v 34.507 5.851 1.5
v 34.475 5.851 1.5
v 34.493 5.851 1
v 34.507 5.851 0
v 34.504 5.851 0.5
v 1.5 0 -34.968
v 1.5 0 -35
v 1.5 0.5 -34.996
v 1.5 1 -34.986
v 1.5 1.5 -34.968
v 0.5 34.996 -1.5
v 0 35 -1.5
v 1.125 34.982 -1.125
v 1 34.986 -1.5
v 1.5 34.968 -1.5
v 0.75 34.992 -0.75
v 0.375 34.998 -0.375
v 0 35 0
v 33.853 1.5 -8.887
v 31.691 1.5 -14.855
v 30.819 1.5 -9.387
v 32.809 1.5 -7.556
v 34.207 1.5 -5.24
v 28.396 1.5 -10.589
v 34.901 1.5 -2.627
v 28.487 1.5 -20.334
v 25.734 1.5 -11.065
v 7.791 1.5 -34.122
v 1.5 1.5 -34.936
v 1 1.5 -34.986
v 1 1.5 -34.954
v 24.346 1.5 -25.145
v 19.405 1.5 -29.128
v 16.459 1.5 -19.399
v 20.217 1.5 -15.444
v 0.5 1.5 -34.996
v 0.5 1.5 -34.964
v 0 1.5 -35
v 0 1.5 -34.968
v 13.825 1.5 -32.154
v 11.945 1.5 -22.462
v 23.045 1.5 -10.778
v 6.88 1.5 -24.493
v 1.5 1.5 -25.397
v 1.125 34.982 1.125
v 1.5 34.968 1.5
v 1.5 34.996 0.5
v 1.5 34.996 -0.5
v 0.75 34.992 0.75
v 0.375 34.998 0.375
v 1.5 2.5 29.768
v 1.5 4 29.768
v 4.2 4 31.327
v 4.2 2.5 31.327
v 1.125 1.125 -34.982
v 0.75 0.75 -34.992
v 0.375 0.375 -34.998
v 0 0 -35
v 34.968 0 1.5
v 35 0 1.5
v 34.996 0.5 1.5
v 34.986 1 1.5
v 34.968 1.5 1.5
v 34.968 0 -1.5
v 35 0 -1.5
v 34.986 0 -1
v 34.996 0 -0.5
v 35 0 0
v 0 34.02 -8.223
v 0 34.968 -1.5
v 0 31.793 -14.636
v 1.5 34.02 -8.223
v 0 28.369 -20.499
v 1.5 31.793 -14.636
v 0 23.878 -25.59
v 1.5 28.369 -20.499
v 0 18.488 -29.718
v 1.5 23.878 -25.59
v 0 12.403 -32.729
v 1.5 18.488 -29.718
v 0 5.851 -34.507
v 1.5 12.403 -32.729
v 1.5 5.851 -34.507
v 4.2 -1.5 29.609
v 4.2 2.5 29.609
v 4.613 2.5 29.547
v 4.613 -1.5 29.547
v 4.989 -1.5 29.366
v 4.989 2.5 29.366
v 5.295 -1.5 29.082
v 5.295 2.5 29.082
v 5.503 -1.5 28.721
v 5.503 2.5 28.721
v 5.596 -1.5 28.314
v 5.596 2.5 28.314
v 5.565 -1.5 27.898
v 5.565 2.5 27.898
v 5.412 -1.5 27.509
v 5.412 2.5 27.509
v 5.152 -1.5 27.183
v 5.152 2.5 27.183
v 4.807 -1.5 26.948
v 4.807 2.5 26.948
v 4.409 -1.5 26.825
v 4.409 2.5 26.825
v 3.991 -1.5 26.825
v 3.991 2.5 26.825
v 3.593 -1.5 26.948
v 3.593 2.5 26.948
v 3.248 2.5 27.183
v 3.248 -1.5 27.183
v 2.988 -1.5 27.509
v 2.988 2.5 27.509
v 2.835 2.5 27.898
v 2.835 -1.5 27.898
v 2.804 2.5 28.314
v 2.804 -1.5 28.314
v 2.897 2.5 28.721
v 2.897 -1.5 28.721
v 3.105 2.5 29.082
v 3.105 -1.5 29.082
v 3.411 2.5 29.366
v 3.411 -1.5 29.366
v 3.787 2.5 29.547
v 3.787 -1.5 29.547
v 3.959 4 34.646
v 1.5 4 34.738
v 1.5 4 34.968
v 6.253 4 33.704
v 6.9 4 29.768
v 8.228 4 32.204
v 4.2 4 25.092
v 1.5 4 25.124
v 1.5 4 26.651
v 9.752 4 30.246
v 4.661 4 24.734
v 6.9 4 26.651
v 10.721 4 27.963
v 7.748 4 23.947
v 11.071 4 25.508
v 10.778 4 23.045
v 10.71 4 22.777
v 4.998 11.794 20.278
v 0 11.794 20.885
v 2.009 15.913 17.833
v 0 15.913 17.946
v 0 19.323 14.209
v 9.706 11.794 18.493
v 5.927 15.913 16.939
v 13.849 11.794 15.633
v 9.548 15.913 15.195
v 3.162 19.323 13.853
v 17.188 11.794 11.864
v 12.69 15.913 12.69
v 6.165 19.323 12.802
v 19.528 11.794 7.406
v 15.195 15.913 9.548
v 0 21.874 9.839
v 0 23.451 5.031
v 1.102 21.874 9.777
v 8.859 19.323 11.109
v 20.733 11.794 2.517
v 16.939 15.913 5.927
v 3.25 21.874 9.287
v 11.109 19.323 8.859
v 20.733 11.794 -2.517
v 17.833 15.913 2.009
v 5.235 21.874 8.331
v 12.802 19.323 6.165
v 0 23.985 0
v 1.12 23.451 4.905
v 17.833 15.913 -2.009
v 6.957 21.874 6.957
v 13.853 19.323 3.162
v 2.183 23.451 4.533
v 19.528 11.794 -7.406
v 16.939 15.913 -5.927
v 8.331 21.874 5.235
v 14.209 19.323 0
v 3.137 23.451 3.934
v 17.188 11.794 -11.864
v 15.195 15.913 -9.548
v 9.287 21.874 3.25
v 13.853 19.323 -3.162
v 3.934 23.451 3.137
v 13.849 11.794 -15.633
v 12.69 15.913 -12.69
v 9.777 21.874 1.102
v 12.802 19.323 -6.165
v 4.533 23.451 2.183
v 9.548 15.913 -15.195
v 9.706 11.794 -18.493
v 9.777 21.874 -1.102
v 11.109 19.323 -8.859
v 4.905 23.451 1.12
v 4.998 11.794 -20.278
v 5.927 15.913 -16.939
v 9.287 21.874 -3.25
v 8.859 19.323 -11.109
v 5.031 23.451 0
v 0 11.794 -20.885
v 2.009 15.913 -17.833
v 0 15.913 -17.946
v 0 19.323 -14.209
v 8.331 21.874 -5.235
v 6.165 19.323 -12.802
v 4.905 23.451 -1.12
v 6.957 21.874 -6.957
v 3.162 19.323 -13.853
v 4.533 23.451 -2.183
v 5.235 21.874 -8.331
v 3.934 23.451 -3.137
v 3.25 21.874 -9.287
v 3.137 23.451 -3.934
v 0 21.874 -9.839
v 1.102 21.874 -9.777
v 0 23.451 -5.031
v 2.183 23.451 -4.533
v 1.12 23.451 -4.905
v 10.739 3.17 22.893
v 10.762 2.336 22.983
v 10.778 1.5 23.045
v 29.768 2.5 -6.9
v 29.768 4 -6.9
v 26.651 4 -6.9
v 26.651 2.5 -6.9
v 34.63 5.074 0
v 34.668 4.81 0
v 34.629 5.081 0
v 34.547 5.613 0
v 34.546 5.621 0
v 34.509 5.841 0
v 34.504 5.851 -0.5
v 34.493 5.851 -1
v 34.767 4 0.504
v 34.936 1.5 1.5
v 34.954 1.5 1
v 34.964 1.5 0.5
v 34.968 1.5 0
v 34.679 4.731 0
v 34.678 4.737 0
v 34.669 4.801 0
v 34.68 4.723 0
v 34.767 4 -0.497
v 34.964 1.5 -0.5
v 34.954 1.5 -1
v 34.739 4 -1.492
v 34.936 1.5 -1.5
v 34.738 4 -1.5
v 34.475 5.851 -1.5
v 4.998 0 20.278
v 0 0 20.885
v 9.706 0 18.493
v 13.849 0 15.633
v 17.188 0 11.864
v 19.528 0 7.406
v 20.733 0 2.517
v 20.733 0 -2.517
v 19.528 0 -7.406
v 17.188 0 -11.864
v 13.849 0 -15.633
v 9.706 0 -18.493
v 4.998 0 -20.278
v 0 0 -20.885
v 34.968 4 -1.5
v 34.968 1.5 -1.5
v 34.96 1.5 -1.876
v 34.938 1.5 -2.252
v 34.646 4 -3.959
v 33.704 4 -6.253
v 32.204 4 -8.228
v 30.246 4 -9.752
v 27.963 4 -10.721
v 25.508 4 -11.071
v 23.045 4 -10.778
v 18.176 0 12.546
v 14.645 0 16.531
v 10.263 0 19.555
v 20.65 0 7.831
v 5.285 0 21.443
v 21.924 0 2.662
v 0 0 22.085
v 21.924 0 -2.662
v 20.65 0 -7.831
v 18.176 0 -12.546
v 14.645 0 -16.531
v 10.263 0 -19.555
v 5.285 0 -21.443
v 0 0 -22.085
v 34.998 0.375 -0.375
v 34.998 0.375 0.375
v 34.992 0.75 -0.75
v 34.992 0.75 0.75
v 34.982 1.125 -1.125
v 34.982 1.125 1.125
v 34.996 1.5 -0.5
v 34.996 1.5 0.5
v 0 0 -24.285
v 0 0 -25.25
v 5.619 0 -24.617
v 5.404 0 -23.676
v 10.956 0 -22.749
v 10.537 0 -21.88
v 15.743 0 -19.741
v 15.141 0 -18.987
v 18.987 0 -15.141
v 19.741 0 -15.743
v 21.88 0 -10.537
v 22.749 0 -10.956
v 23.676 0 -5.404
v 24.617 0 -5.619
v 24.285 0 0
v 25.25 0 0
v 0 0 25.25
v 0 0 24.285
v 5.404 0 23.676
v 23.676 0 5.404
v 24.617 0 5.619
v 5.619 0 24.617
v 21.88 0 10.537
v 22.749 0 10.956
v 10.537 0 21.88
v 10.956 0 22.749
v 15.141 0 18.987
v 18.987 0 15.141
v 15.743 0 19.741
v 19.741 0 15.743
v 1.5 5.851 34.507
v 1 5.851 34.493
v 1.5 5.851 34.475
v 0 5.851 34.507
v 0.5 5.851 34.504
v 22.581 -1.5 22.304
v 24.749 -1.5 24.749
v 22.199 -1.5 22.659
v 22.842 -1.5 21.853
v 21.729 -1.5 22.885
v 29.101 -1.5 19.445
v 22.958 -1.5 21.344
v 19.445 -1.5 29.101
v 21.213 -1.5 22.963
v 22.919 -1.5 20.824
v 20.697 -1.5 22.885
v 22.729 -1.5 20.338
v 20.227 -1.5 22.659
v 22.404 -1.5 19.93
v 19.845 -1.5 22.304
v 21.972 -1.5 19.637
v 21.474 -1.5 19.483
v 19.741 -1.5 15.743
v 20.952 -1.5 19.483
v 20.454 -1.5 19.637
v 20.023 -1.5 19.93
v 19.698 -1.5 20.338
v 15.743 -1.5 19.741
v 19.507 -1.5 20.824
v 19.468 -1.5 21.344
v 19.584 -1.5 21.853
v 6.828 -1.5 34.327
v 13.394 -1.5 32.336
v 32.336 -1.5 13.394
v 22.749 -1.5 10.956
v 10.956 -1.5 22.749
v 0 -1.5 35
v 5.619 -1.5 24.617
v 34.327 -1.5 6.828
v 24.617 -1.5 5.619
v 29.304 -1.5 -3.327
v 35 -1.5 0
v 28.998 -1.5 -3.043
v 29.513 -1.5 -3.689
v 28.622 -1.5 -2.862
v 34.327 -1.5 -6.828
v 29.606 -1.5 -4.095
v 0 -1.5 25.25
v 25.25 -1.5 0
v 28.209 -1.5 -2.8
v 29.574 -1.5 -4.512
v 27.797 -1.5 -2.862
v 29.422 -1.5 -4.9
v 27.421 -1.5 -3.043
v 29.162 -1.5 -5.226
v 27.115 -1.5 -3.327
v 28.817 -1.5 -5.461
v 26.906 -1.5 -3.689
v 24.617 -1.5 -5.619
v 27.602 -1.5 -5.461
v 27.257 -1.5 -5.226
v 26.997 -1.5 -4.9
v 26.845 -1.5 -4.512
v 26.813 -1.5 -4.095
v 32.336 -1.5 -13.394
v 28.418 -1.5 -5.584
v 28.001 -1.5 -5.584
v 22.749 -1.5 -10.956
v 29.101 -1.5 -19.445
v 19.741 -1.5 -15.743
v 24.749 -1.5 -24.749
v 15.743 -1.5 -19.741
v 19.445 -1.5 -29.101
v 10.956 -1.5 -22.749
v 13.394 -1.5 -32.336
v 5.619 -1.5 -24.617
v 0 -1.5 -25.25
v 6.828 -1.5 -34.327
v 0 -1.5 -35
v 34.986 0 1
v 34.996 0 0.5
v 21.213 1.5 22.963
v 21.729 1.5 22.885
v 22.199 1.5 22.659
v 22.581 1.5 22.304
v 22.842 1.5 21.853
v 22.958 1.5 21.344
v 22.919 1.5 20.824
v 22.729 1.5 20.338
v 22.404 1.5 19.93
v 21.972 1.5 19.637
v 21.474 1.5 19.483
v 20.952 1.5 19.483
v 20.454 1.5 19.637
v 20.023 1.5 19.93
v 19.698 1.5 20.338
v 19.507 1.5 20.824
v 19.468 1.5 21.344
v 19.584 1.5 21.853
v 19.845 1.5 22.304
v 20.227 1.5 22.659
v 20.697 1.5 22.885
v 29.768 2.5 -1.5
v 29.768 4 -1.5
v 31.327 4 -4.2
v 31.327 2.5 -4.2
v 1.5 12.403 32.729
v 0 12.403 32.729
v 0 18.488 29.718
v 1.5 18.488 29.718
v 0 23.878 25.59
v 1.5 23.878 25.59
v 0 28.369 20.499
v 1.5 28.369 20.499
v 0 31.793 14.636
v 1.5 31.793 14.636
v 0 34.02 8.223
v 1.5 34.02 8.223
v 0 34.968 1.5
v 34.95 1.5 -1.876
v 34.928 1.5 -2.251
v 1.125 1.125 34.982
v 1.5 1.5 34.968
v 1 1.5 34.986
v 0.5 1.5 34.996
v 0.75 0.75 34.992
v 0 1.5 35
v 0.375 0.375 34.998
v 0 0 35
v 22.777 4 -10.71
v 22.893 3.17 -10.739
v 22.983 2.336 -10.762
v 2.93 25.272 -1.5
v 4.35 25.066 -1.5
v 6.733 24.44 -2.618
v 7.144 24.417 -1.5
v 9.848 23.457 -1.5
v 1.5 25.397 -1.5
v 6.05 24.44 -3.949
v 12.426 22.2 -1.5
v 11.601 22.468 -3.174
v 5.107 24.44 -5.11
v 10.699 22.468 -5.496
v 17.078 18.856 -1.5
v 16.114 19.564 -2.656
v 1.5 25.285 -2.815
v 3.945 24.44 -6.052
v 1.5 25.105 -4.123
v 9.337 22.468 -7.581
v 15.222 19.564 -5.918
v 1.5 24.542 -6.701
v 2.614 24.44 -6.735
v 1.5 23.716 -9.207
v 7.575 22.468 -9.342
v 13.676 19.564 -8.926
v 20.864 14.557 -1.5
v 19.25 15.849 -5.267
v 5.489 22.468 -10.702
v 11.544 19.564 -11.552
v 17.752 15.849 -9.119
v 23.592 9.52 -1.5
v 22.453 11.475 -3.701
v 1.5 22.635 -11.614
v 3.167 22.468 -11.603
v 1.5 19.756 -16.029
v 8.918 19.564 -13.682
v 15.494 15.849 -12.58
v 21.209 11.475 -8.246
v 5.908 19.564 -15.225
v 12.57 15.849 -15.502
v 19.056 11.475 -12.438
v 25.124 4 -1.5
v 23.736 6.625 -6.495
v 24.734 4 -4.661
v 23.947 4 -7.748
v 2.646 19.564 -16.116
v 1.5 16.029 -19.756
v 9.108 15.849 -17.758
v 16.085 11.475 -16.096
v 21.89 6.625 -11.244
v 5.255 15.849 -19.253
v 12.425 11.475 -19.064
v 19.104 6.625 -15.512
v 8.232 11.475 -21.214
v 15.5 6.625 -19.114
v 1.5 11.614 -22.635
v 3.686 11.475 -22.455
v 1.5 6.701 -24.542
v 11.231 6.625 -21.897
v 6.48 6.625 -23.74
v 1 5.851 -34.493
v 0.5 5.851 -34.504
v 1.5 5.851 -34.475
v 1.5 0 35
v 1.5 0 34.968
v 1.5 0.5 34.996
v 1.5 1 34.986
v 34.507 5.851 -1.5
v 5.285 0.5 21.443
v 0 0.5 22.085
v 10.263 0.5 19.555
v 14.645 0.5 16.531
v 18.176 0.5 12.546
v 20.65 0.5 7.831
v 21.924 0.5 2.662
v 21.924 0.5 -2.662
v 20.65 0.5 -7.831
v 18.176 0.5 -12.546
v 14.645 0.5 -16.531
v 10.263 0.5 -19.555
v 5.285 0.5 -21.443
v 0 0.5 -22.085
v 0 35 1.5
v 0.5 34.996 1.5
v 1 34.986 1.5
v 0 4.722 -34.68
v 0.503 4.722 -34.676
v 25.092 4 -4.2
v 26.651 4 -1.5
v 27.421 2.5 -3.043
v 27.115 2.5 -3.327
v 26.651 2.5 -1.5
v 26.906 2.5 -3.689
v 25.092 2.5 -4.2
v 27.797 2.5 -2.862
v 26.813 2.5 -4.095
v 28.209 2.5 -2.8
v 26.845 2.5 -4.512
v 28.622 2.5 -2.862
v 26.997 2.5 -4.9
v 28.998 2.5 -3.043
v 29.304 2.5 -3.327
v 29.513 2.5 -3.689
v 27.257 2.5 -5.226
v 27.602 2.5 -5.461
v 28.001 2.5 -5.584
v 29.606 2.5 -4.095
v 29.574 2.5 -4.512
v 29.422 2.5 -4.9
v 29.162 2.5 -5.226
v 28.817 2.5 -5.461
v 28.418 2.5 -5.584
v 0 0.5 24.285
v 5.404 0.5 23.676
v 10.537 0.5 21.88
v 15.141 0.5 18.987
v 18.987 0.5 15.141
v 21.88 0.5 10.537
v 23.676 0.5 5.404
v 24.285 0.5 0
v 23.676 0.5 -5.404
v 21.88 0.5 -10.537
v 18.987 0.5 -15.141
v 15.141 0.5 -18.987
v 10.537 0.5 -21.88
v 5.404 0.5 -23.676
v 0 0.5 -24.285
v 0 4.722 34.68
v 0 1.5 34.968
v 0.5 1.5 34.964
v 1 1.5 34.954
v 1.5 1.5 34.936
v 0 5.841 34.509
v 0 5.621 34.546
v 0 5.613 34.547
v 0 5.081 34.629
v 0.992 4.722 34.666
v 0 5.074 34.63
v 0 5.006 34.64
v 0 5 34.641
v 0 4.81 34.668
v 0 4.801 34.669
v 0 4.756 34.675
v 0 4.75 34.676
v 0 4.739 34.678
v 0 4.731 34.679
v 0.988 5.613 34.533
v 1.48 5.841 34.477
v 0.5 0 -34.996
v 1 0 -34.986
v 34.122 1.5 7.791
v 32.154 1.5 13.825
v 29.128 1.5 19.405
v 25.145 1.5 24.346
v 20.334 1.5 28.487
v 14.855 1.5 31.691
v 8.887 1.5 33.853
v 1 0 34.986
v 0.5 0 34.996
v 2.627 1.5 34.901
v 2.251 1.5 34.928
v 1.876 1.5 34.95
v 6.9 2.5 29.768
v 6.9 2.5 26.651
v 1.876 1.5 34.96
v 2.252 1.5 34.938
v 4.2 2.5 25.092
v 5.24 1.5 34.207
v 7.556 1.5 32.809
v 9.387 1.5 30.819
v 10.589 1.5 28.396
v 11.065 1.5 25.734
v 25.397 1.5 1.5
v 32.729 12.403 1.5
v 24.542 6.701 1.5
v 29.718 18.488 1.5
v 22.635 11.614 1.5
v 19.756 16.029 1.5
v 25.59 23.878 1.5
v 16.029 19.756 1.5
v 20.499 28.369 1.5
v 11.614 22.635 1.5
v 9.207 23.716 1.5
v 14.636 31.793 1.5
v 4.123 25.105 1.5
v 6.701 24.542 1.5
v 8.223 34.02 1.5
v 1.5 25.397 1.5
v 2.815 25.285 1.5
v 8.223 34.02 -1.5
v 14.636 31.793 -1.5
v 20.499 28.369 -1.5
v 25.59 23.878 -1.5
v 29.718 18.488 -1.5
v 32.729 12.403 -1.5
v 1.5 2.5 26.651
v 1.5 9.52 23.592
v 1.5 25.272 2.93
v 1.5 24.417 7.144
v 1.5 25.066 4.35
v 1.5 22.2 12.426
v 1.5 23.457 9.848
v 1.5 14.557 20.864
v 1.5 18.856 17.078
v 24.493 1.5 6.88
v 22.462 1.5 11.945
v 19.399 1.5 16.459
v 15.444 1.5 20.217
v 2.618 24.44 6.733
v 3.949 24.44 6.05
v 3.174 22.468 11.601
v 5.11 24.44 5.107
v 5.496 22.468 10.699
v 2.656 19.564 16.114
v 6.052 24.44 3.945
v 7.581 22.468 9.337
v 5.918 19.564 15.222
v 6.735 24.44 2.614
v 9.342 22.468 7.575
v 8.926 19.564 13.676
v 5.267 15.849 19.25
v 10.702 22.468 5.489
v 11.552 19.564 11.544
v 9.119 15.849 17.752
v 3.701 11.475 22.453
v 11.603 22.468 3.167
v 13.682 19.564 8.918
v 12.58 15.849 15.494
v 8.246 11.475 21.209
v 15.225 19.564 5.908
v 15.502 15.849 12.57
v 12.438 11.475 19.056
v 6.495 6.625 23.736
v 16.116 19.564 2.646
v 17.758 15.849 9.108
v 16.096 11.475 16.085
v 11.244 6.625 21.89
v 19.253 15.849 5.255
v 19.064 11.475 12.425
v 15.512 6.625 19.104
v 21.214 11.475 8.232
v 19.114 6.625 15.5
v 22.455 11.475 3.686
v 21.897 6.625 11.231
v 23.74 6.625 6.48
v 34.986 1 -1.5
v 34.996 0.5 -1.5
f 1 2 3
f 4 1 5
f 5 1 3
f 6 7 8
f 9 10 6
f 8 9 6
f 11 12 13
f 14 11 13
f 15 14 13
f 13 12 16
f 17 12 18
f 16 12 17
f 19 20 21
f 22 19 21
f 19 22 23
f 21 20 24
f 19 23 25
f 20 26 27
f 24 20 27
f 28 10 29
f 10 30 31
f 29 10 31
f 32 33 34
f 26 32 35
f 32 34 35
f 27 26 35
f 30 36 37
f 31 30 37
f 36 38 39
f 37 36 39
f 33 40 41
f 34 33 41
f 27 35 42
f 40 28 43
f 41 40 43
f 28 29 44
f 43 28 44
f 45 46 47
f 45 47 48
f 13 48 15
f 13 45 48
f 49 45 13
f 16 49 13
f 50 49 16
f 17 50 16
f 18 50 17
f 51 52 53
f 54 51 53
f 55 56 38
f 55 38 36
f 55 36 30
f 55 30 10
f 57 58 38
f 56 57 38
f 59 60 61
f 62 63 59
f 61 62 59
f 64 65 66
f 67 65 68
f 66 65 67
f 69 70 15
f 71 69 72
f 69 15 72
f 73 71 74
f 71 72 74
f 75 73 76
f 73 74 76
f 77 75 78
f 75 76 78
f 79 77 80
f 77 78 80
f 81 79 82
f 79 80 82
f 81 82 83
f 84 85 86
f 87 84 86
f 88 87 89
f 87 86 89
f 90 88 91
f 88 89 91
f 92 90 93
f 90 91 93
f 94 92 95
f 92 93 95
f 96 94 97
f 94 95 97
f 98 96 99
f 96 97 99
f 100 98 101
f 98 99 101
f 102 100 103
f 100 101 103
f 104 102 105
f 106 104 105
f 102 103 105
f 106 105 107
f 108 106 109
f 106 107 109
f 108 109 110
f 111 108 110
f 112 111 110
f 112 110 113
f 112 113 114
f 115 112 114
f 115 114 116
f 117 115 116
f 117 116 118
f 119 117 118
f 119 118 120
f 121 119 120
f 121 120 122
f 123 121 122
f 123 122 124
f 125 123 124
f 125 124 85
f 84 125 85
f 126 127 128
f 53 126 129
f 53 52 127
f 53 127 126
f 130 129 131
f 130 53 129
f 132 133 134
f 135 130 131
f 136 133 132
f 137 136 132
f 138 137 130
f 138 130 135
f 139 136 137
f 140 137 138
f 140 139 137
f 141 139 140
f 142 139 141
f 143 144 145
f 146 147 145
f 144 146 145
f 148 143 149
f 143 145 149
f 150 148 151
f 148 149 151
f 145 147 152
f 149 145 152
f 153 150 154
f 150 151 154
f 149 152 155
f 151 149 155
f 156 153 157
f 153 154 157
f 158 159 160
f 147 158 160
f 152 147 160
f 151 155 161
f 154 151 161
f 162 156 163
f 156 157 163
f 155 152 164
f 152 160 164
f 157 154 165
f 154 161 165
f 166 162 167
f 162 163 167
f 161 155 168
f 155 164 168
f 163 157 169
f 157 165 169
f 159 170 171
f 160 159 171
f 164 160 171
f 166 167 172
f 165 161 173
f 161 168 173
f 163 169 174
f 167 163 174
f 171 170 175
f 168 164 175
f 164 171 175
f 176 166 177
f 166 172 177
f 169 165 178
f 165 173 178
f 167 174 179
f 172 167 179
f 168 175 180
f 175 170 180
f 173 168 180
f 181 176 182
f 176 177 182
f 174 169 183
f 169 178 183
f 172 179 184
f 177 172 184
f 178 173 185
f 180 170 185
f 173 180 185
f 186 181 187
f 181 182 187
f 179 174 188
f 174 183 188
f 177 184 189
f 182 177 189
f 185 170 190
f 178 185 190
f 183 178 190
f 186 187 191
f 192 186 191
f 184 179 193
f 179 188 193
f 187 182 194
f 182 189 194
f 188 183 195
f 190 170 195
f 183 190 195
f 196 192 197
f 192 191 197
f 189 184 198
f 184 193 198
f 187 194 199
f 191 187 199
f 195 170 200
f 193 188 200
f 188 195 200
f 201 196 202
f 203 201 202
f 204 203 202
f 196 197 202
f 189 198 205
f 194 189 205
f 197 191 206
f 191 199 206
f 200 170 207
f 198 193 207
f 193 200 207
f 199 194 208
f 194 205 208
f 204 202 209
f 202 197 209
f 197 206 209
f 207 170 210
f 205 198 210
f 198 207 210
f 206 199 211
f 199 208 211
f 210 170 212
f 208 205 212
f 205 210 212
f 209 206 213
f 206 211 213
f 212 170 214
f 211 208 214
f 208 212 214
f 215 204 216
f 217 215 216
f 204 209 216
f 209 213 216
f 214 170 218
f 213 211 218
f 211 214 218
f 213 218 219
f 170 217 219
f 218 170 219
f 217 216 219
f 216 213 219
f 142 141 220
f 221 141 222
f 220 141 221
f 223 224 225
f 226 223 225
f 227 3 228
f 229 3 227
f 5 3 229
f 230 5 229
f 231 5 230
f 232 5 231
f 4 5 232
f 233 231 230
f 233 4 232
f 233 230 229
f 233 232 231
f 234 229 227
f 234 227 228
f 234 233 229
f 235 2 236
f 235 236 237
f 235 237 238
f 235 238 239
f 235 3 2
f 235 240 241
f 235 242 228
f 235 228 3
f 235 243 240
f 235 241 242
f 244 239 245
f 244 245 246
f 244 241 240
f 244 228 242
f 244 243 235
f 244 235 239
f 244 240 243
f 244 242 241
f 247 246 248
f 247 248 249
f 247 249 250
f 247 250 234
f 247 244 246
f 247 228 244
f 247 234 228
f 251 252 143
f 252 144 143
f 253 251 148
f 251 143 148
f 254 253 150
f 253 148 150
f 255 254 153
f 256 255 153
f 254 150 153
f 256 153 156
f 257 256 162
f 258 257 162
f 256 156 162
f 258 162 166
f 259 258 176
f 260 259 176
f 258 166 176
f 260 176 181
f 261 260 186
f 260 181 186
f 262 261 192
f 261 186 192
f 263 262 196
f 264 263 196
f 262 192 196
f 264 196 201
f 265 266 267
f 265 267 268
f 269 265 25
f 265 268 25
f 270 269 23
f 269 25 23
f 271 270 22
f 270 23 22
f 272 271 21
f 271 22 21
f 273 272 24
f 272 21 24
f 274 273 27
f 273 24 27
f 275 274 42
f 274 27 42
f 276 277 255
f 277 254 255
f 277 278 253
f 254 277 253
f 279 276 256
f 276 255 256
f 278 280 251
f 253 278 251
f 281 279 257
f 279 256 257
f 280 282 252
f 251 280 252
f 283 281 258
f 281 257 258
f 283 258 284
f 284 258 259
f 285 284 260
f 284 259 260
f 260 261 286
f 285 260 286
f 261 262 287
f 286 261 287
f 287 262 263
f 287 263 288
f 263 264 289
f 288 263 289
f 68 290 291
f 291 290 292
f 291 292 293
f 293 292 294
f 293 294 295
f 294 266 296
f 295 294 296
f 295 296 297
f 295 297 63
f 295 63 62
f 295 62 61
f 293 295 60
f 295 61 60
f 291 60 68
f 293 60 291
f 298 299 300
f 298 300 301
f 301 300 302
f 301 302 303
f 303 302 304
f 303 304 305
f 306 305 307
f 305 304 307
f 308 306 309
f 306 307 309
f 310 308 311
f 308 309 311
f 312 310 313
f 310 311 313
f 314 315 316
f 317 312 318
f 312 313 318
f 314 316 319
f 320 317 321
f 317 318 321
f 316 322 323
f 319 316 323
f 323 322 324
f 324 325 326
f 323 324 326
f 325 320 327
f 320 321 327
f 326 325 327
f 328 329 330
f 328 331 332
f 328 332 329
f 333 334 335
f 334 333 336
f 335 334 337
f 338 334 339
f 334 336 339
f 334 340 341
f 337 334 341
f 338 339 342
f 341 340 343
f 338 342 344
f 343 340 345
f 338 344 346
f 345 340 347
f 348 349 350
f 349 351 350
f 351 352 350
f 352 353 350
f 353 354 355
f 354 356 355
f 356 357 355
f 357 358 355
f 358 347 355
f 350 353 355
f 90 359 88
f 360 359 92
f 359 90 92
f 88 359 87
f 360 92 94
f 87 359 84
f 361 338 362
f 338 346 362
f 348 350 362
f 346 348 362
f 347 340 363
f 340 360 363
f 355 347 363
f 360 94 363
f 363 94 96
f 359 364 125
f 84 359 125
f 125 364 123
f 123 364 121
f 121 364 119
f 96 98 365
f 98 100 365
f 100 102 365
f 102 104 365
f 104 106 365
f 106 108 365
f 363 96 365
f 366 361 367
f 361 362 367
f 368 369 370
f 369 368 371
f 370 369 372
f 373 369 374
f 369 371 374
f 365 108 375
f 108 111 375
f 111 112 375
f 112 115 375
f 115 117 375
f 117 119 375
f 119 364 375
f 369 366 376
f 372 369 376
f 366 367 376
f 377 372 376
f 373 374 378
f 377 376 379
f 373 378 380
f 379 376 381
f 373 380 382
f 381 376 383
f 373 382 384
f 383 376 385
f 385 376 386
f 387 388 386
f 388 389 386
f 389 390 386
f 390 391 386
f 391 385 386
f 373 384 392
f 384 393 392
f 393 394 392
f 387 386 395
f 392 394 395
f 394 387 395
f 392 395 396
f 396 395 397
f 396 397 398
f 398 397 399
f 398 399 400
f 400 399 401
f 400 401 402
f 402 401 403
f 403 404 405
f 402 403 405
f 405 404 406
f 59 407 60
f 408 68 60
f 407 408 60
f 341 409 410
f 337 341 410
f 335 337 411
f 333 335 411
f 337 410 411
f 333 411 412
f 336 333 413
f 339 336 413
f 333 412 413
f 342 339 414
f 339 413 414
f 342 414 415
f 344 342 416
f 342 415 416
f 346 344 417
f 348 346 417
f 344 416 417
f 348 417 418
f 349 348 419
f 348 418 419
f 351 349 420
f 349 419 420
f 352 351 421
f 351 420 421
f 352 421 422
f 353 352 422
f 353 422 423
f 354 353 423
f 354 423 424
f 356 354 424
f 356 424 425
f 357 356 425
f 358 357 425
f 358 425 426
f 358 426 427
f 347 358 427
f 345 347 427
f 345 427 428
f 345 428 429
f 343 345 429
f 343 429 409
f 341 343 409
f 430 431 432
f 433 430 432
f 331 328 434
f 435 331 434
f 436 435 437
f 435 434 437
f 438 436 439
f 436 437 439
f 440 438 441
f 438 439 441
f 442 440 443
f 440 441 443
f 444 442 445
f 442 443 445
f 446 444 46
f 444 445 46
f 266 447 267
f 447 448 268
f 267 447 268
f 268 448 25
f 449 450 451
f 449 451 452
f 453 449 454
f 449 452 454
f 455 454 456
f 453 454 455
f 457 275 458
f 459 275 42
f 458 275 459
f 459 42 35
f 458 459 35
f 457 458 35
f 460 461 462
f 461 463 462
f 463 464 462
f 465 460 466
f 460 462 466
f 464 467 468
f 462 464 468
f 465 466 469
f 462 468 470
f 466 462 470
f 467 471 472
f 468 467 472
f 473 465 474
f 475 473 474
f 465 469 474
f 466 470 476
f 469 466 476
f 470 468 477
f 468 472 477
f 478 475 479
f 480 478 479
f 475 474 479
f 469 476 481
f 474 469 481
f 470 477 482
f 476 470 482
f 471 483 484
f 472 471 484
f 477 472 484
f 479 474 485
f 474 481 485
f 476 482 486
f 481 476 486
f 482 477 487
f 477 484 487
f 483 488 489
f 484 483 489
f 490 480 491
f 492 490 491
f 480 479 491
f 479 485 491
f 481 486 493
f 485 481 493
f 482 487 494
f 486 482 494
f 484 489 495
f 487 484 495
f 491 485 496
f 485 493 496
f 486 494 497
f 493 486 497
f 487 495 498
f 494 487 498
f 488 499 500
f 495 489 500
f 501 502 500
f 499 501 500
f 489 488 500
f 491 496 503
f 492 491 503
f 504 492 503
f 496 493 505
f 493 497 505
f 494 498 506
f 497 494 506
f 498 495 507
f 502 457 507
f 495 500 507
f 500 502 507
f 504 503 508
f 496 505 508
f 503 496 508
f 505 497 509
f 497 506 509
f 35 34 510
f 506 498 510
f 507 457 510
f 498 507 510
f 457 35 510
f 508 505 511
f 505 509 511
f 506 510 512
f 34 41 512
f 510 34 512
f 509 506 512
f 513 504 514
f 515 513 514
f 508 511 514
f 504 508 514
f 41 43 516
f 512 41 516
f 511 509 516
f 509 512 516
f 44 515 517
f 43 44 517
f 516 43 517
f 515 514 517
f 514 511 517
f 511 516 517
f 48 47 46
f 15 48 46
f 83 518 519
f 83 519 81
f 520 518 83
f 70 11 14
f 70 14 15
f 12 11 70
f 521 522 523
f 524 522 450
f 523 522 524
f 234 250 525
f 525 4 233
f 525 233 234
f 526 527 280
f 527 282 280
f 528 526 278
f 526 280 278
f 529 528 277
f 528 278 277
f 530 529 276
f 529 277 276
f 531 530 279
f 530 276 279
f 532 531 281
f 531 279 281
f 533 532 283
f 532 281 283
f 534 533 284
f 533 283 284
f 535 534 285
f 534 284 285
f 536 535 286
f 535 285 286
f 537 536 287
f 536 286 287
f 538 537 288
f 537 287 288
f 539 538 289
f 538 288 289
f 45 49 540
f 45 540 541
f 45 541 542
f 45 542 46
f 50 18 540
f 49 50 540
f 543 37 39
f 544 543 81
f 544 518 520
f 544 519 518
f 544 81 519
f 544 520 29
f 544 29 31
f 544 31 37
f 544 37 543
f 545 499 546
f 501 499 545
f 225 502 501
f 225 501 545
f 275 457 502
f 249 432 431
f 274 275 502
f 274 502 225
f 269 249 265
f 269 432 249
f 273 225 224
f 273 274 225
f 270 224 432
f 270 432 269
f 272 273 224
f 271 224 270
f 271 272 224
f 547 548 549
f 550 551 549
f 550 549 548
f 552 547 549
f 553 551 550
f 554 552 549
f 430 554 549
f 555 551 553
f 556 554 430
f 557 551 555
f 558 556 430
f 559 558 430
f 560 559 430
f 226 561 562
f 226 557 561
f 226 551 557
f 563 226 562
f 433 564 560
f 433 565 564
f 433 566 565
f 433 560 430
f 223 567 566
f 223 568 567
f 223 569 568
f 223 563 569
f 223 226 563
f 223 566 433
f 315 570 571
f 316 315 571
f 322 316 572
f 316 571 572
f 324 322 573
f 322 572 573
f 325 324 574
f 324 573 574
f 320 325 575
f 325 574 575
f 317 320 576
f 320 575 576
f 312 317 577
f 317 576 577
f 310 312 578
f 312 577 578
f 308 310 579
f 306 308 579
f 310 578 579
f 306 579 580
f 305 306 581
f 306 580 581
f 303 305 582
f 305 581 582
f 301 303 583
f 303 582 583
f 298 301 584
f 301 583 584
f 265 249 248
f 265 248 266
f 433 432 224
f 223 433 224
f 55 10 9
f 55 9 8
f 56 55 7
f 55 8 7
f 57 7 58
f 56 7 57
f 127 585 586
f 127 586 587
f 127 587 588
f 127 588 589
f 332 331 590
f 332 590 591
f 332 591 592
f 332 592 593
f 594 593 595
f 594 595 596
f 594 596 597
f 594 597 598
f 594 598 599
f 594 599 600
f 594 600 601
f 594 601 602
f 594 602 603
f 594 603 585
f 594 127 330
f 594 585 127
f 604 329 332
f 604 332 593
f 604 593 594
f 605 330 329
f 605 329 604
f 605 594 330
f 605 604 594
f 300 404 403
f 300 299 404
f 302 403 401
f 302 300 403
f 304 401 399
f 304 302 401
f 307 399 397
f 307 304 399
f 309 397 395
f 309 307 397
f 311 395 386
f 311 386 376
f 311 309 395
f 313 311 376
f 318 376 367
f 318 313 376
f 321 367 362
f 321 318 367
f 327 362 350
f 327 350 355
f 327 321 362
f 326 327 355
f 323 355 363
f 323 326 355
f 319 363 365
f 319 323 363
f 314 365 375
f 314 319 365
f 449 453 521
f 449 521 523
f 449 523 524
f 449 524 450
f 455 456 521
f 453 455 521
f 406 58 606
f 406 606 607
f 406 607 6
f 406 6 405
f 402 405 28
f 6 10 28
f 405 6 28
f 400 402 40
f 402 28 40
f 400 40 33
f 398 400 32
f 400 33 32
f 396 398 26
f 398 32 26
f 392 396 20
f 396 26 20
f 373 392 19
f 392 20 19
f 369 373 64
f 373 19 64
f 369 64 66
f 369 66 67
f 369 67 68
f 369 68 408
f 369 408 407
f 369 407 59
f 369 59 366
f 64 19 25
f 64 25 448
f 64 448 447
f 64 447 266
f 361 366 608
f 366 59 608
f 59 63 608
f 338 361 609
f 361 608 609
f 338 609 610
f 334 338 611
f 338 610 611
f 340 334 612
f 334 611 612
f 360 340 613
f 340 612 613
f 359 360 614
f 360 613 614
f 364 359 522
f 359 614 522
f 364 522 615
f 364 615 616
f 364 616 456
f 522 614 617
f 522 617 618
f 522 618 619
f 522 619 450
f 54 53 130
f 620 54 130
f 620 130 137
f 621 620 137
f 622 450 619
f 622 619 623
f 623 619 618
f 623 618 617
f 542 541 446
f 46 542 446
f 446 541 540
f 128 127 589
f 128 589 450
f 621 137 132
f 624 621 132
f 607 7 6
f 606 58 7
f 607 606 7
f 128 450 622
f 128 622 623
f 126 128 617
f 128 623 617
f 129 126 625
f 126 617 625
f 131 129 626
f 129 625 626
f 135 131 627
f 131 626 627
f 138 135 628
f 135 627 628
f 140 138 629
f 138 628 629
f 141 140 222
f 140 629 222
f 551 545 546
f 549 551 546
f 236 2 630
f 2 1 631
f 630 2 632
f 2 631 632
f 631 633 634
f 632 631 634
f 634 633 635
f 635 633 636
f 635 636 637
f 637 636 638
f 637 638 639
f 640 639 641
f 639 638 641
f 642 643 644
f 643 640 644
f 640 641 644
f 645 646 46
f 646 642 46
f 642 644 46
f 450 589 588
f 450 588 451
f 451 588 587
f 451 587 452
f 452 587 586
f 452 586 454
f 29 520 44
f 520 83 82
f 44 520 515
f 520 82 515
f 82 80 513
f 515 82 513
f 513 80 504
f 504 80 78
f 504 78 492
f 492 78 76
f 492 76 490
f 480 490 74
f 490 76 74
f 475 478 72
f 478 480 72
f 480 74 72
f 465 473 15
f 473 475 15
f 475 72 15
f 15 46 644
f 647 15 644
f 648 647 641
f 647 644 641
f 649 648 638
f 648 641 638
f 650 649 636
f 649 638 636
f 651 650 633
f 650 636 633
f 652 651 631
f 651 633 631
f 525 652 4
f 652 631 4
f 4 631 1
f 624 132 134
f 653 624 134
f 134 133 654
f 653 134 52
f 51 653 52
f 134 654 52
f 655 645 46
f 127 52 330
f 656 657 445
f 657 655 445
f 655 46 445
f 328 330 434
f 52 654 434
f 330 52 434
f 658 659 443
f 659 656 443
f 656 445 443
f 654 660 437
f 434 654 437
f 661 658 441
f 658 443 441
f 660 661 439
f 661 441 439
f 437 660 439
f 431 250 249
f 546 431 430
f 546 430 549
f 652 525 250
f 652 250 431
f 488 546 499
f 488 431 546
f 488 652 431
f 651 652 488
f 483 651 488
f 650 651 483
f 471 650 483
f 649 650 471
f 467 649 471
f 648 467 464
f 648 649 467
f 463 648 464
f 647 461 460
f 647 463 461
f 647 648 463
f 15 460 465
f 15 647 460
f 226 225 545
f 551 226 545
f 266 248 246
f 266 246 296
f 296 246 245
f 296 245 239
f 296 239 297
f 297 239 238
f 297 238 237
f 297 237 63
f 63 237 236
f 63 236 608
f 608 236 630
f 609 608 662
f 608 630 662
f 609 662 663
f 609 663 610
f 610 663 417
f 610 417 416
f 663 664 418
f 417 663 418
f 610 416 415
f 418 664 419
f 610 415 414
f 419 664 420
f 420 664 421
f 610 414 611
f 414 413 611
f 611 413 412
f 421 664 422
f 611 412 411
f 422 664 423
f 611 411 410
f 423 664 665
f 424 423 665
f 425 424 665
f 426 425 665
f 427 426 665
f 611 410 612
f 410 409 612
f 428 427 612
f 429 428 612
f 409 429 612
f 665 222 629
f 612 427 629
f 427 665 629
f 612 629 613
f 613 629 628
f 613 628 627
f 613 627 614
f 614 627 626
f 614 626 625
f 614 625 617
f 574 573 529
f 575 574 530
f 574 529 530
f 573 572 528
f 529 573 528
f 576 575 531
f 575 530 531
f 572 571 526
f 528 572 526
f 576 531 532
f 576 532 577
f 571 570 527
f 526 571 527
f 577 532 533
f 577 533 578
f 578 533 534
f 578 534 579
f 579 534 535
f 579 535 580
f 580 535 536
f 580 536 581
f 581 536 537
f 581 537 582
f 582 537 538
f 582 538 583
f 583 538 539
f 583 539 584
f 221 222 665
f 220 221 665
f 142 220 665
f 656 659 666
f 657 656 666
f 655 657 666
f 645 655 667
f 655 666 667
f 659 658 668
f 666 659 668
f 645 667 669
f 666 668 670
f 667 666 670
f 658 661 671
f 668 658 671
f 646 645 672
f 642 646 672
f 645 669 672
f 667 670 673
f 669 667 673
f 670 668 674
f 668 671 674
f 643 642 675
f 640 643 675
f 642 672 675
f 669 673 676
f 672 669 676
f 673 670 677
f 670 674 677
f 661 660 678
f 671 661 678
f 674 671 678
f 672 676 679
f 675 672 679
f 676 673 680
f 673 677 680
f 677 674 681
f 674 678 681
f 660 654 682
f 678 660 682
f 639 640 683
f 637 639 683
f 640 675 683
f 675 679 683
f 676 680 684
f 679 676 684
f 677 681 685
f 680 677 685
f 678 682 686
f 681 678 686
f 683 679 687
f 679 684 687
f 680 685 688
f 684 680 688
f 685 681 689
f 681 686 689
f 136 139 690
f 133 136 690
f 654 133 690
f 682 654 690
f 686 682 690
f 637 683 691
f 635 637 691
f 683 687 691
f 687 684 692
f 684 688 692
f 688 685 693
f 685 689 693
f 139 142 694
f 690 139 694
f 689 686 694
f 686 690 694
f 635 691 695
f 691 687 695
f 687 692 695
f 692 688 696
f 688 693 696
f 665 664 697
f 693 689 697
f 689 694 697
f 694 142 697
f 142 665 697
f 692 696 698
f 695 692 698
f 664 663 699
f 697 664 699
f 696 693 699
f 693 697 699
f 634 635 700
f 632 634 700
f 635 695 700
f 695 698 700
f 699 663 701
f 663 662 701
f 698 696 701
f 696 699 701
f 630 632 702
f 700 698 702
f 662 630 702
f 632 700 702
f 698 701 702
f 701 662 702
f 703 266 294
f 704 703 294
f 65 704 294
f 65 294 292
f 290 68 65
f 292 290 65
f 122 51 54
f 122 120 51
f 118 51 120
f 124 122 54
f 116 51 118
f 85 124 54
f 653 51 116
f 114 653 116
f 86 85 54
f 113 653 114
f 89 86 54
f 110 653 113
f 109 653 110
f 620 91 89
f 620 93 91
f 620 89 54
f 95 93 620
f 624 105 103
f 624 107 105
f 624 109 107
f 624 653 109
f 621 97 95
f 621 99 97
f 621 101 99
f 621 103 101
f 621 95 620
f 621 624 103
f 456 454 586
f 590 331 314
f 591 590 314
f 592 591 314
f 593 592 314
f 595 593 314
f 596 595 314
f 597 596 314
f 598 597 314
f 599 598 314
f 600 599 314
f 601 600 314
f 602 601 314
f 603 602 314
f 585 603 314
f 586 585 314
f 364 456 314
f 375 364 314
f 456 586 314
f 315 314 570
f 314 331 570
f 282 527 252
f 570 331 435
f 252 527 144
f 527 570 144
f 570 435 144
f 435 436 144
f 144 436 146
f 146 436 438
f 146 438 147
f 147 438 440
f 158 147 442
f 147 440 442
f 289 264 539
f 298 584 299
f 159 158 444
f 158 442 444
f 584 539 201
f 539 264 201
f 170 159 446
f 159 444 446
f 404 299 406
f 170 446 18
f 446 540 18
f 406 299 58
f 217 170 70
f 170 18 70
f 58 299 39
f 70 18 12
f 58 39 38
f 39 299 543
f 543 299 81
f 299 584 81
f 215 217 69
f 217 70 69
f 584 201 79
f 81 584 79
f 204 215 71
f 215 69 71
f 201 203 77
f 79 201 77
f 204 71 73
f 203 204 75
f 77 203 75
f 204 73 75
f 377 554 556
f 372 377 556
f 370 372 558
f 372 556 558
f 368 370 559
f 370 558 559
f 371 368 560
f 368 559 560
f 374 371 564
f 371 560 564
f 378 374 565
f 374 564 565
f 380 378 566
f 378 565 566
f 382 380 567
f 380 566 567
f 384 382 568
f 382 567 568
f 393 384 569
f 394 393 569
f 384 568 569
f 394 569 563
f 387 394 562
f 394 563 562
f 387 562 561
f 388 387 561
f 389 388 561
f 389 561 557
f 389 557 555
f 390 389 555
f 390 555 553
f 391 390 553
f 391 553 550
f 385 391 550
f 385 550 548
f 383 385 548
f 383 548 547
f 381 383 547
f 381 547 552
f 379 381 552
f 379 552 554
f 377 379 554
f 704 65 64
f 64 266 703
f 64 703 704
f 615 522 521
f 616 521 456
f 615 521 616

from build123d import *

# Parameters (mm, degrees)
BOSS_EXTRUDE1_DEPTH      = 1.5
BOSS_EXTRUDE1_DEPTH_BACK = 1.5
BOSS_EXTRUDE2_DEPTH      = 1.5
BOSS_EXTRUDE2_DEPTH_BACK = 1.5
SKETCH6_W                = 9.75
SKETCH6_H                = 3
SKETCH6_W_2              = 0.965
SKETCH6_H_2              = 1.5
BOSS_EXTRUDE4_DEPTH      = 2.5
CUT_EXTRUDE1_DEPTH       = 1.5
SKETCH11_R               = 1.4
CUT_EXTRUDE2_DEPTH       = 60.213596412
SKETCH13_R               = 10.5
BOSS_EXTRUDE5_DEPTH      = 2
BOSS_EXTRUDE5_DEPTH_BACK = 5
CUT_EXTRUDE3_DEPTH       = 10
CUT_EXTRUDE3_DEPTH_BACK  = 10
SKETCH15_R               = 9
CUT_EXTRUDE4_DEPTH       = 10
CUT_EXTRUDE5_DEPTH       = 4.1
SKETCH19_R               = 8.75
CUT_EXTRUDE6_DEPTH       = 2.5
SKETCH23_R               = 1.75
CUT_EXTRUDE9_DEPTH       = 10


with BuildPart() as part:
    # Sketch1 → Revolve1 (revolve)
    with BuildSketch(Plane.XY, mode=Mode.PRIVATE) as revolve1_sk:
        with BuildLine():
            Line((-20.885, 0), (-20.885, 11.793939121))
            ThreePointArc((-20.885, 11.793939121), (-12.091372858, 20.714220415), (0, 23.985))
            Line((0, 23.985), (0, 25.485))
            ThreePointArc((0, 25.485), (-18.020616319, 18.020616319), (-25.485, 0))
            Line((-25.485, 0), (-24.285, 0))
            Line((-24.285, 0), (-24.285, 0.5))
            Line((-24.285, 0.5), (-22.085, 0.5))
            Line((-22.085, 0.5), (-22.085, 0))
            Line((-22.085, 0), (-20.885, 0))
        make_face()
    revolve(revolve1_sk.sketch.rotate(Axis((0, 0, 0), (0, 1, 0)), 270), axis=Axis((0, 0, 0), (0, 1, 0)))



with BuildPart() as body_2:
    # Sketch2 → Boss-Extrude1 (new, two sides)
    with BuildSketch(Plane.XY) as boss_extrude1_sk:
        with BuildLine():
            Line((-24.9, 0), (-35, 0))
            ThreePointArc((-35, 0), (0, 35), (35, 0))
            Line((35, 0), (24.9, 0))
            ThreePointArc((24.9, 0), (0, 24.9), (-24.9, 0))
        make_face()
    extrude(amount=BOSS_EXTRUDE1_DEPTH)
    extrude(boss_extrude1_sk.sketch, amount=-BOSS_EXTRUDE1_DEPTH_BACK)

    # Sketch3 → Boss-Extrude2 (add, two sides)
    with BuildSketch(Plane(origin=(0, 0, 0), x_dir=(0, 0, -1), z_dir=(1, 0, 0))) as boss_extrude2_sk:
        with BuildLine():
            Line((35, 0), (24.9, 0))
            ThreePointArc((24.9, 0), (0, 24.9), (-24.9, 0))
            Line((-24.9, 0), (-35, 0))
            ThreePointArc((-35, 0), (0, 35), (35, 0))
        make_face()
    extrude(amount=BOSS_EXTRUDE2_DEPTH)
    extrude(boss_extrude2_sk.sketch, amount=-BOSS_EXTRUDE2_DEPTH_BACK)


with BuildPart() as part_1:
    add(part.part)

    add(body_2.part)  # Revolve3 merges body 2
    # Sketch6 → Revolve3 (revolve)
    with BuildSketch(Plane(origin=(0, 0, 0), x_dir=(0, 0, -1), z_dir=(1, 0, 0)), mode=Mode.PRIVATE) as revolve3_sk:
        with Locations((30.125, 0)):
            Rectangle(SKETCH6_W, SKETCH6_H)
        with Locations((24.7675, 0.75)):
            Rectangle(SKETCH6_W_2, SKETCH6_H_2)
    revolve(revolve3_sk.sketch.rotate(Axis((0, 0, 0), (0, -1, 0)), 180), axis=Axis((0, 0, 0), (0, -1, 0)))

    # Sketch9 → Cut-Revolve1 (revolve, cut)
    with BuildSketch(Plane.XY, mode=Mode.PRIVATE) as cut_revolve1_sk:
        with BuildLine():
            Line((34.507469645, 5.851028856), (35.470882951, 5.851028856))
            Line((35.470882951, 5.851028856), (35.470882951, 1.5))
            Line((35.470882951, 1.5), (34.96784237, 1.5))
            ThreePointArc((34.96784237, 1.5), (34.805712289, 3.682715312), (34.507469645, 5.851028856))
        make_face()
    revolve(cut_revolve1_sk.sketch.rotate(Axis((0, 0, 0), (0, 1, 0)), 180), axis=Axis((0, 0, 0), (0, 1, 0)), mode=Mode.SUBTRACT)

    # Sketch7 → Boss-Extrude4 (add)
    with BuildSketch(Plane(origin=(0, 1.5, 0), x_dir=(1, 0, 0), z_dir=(0, 1, 0))):
        with BuildLine():
            Line((23.044996888, 10.777909974), (22.609782845, 10.667601403))
            ThreePointArc((22.609782845, 10.667601403), (24.220082694, 6.195772291), (24.954959427, 1.5))
            Line((24.954959427, 1.5), (25.396559314, 1.5))
            Line((25.396559314, 1.5), (34.96784237, 1.5))
            ThreePointArc((34.96784237, 1.5), (31.274568745, 9.053705347), (23.044996888, 10.777909974))
        make_face()
        with BuildLine():
            ThreePointArc((10.667601403, -22.609782845), (6.195772291, -24.220082694), (1.5, -24.954959427))
            Line((1.5, -24.954959427), (1.5, -25.396559314))
            Line((1.5, -25.396559314), (1.5, -34.96784237))
            ThreePointArc((1.5, -34.96784237), (9.053705347, -31.274568745), (10.777909974, -23.044996888))
            Line((10.777909974, -23.044996888), (10.667601403, -22.609782845))
        make_face()
        with BuildLine():
            Line((-25.396559314, -1.5), (-34.96784237, -1.5))
            ThreePointArc((-34.96784237, -1.5), (-31.274568745, -9.053705347), (-23.044996888, -10.777909974))
            Line((-23.044996888, -10.777909974), (-22.609782845, -10.667601403))
            ThreePointArc((-22.609782845, -10.667601403), (-24.220082694, -6.195772291), (-24.954959427, -1.5))
            Line((-24.954959427, -1.5), (-25.396559314, -1.5))
        make_face()
        with BuildLine():
            ThreePointArc((-2.626689255, 34.901296588), (-9.387133949, 30.818973666), (-10.777909974, 23.044996888))
            ThreePointArc((-10.777909974, 23.044996888), (-6.25053836, 24.661021779), (-1.5, 25.396559314))
            Line((-1.5, 25.396559314), (-1.5, 34.96784237))
            ThreePointArc((-1.5, 34.96784237), (-2.063612885, 34.939111349), (-2.626689255, 34.901296588))
        make_face()
        with BuildLine():
            Line((-10.777909974, 23.044996888), (-10.667601403, 22.609782845))
            ThreePointArc((-10.667601403, 22.609782845), (-6.195772291, 24.220082694), (-1.5, 24.954959427))
            Line((-1.5, 24.954959427), (-1.5, 25.396559314))
            ThreePointArc((-1.5, 25.396559314), (-6.25053836, 24.661021779), (-10.777909974, 23.044996888))
        make_face()
    extrude(amount=BOSS_EXTRUDE4_DEPTH)

    # Sketch10 → Cut-Extrude1 (cut)
    with BuildSketch(Plane(origin=(0, 4, 0), x_dir=(1, 0, 0), z_dir=(0, 1, 0))):
        Polygon((4.2, -31.327119097), (6.9, -29.76827337), (6.9, -26.650581916), (4.2, -25.091736189), (1.5, -26.650581916), (1.5, -29.76827337), align=None)
        Polygon((-25.091736189, -4.2), (-26.650581916, -1.5), (-29.76827337, -1.5), (-31.327119097, -4.2), (-29.76827337, -6.9), (-26.650581916, -6.9), align=None)
        Polygon((-4.2, 31.327119097), (-6.9, 29.76827337), (-6.9, 26.650581916), (-4.2, 25.091736189), (-1.5, 26.650581916), (-1.5, 29.76827337), align=None)
        Polygon((31.327119097, 4.2), (29.76827337, 6.9), (26.650581916, 6.9), (25.091736189, 4.2), (26.650581916, 1.5), (29.76827337, 1.5), align=None)
    extrude(amount=-CUT_EXTRUDE1_DEPTH, mode=Mode.SUBTRACT)

    # Sketch11 → Cut-Extrude2 (cut, through all)
    with BuildSketch(Plane(origin=(0, 2.5, 0), x_dir=(1, 0, 0), z_dir=(0, 1, 0))):
        with Locations(Location((28.209427643, 4.2, 0), (0, 0, 270))):
            Circle(SKETCH11_R)
        with Locations(Location((4.2, -28.209427643, 0), (0, 0, 270))):
            Circle(SKETCH11_R)
        with Locations(Location((-28.209427643, -4.2, 0), (0, 0, 270))):
            Circle(SKETCH11_R)
        with Locations(Location((-4.2, 28.209427643, 0), (0, 0, 270))):
            Circle(SKETCH11_R)
    extrude(amount=-CUT_EXTRUDE2_DEPTH, mode=Mode.SUBTRACT)

    # Sketch13 → Boss-Extrude5 (add, two sides)
    with BuildSketch(Plane(origin=(-12.655947457, 12.655947457, 12.655947457), x_dir=(-0.8164965809277261, -0.408248290463863, -0.408248290463863), z_dir=(0.5773502691896257, -0.5773502691896258, -0.5773502691896258))) as boss_extrude5_sk:
        with Locations(Location((0, 0, 0), (0, 0, 270))):
            Circle(SKETCH13_R)
    extrude(amount=BOSS_EXTRUDE5_DEPTH)
    extrude(boss_extrude5_sk.sketch, amount=-BOSS_EXTRUDE5_DEPTH_BACK)

    # Sketch12 → Cut-Extrude3 (cut, two sides)
    with BuildSketch(Plane(origin=(-12.655947457, 12.655947457, 12.655947457), x_dir=(-0.8164965809277261, -0.408248290463863, -0.408248290463863), z_dir=(0.5773502691896257, -0.5773502691896258, -0.5773502691896258))) as cut_extrude3_sk:
        with BuildLine():
            Line((0.352106197, -6.089829327), (5.097893803, -3.349847575))
            ThreePointArc((5.097893803, -3.349847575), (5.282754963, 3.05), (-0.352106197, 6.089829327))
            Line((-0.352106197, 6.089829327), (-5.097893803, 3.349847575))
            ThreePointArc((-5.097893803, 3.349847575), (-5.282754963, -3.05), (0.352106197, -6.089829327))
        make_face()
    extrude(amount=CUT_EXTRUDE3_DEPTH, mode=Mode.SUBTRACT)
    extrude(cut_extrude3_sk.sketch, amount=-CUT_EXTRUDE3_DEPTH_BACK, mode=Mode.SUBTRACT)

    # Sketch15 → Cut-Extrude4 (cut)
    with BuildSketch(Plane(origin=(-11.501246918, 11.501246918, 11.501246918), x_dir=(-0.40824829046386274, 0.40824829046386296, -0.8164965809277264), z_dir=(0.5773502691896258, -0.5773502691896262, -0.5773502691896255))):
        Circle(SKETCH15_R)
    extrude(amount=CUT_EXTRUDE4_DEPTH, mode=Mode.SUBTRACT)

    # Sketch18 → Cut-Extrude5 (cut)
    with BuildSketch(Plane(origin=(-15.542698803, 15.542698803, 15.542698803), x_dir=(0.40824829046386274, -0.40824829046386296, 0.8164965809277264), z_dir=(-0.5773502691896258, 0.5773502691896262, 0.5773502691896255))):
        with BuildLine():
            Line((0.654858953, -7.06973548), (5.795141047, -4.101992229))
            ThreePointArc((5.795141047, -4.101992229), (6.148780367, 3.55), (-0.654858953, 7.06973548))
            ThreePointArc((-0.654858953, 7.06973548), (-3.55, 6.148780367), (-5.795141047, 4.101992229))
            ThreePointArc((-5.795141047, 4.101992229), (-6.148780367, -3.55), (0.654858953, -7.06973548))
        make_face()
    extrude(amount=-CUT_EXTRUDE5_DEPTH, mode=Mode.SUBTRACT)

    # Sketch19 → Cut-Extrude6 (cut)
    with BuildSketch(Plane(origin=(-15.542698803, 15.542698803, 15.542698803), x_dir=(0.40824829046386274, -0.40824829046386296, 0.8164965809277264), z_dir=(-0.5773502691896258, 0.5773502691896262, 0.5773502691896255))):
        with Locations(Location((0, 0, 0), (0, 0, 270))):
            Circle(SKETCH19_R)
    extrude(amount=-CUT_EXTRUDE6_DEPTH, mode=Mode.SUBTRACT)

    # Sketch23 → Cut-Extrude9 (cut)
    with BuildSketch(Plane(origin=(0, 1.5, 0), x_dir=(1, 0, 0), z_dir=(0, 1, 0))):
        with Locations(Location((21.213203436, -21.213203436, 0), (0, 0, 270))):
            Circle(SKETCH23_R)
        with Locations(Location((-21.213203436, 21.213203436, 0), (0, 0, 270))):
            Circle(SKETCH23_R)
    extrude(amount=-CUT_EXTRUDE9_DEPTH, mode=Mode.SUBTRACT)

    # SurfaceCut1
    split(bisect_by=Plane(origin=(0, 0, 0), x_dir=(0, 0, -1), z_dir=(1, 0, 0)), keep=Keep.TOP)


solid = part_1.part
